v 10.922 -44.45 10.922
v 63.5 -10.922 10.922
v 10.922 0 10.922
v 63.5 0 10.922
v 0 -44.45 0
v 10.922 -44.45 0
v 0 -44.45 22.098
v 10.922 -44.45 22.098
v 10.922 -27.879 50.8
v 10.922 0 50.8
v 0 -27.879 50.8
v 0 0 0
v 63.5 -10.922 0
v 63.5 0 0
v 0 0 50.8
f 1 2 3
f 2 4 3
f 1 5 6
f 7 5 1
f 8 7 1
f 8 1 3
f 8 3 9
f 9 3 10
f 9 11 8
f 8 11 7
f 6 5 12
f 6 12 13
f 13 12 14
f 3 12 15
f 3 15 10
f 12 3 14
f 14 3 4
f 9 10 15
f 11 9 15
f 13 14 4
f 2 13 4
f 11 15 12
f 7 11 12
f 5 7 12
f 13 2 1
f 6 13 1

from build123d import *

# Parameters (mm, degrees)
F1_DEPTH = 10.922
F3_DEPTH = 33.528
F5_DEPTH = 25.4
F7_DEPTH = 25.4


# Not quite as in the source:
# - a feature names something its author has since deleted; it is built from what else it names


with BuildPart() as f1:
    # F0 (on Front) → F1 (new body)
    with BuildSketch(Plane.XZ):
        Polygon((0, 50.8), (0, 0), (63.5, 0), (63.5, 10.922), (10.922, 10.922), (10.922, 50.8), align=None)
    extrude(amount=F1_DEPTH)

    # F2 (on face) → F3 (join)
    with BuildSketch(Plane.XZ.offset(10.922)):
        Polygon((0, 10.922), (0, 0), (10.922, 0), (63.5, 0), (63.5, 10.922), (10.922, 10.922), (10.922, 50.8), (0, 50.8), align=None)
    extrude(amount=F3_DEPTH)

    # F4 (on face) → F5 (cut)
    with BuildSketch(Plane.XY.offset(10.922)):
        Polygon((63.5, -10.922), (10.922, -44.45), (63.5, -44.45), align=None)
    extrude(amount=-F5_DEPTH, mode=Mode.SUBTRACT)

    # F6 (on face) → F7 (cut)
    with BuildSketch(Plane(origin=(0, 0, 0), x_dir=(0, -1, 0), z_dir=(-1, 0, 0))):
        Polygon((27.8788925737, 50.8), (44.45, 22.098), (44.45, 50.8), align=None)
    extrude(amount=-F7_DEPTH, mode=Mode.SUBTRACT)


solid = f1.part
